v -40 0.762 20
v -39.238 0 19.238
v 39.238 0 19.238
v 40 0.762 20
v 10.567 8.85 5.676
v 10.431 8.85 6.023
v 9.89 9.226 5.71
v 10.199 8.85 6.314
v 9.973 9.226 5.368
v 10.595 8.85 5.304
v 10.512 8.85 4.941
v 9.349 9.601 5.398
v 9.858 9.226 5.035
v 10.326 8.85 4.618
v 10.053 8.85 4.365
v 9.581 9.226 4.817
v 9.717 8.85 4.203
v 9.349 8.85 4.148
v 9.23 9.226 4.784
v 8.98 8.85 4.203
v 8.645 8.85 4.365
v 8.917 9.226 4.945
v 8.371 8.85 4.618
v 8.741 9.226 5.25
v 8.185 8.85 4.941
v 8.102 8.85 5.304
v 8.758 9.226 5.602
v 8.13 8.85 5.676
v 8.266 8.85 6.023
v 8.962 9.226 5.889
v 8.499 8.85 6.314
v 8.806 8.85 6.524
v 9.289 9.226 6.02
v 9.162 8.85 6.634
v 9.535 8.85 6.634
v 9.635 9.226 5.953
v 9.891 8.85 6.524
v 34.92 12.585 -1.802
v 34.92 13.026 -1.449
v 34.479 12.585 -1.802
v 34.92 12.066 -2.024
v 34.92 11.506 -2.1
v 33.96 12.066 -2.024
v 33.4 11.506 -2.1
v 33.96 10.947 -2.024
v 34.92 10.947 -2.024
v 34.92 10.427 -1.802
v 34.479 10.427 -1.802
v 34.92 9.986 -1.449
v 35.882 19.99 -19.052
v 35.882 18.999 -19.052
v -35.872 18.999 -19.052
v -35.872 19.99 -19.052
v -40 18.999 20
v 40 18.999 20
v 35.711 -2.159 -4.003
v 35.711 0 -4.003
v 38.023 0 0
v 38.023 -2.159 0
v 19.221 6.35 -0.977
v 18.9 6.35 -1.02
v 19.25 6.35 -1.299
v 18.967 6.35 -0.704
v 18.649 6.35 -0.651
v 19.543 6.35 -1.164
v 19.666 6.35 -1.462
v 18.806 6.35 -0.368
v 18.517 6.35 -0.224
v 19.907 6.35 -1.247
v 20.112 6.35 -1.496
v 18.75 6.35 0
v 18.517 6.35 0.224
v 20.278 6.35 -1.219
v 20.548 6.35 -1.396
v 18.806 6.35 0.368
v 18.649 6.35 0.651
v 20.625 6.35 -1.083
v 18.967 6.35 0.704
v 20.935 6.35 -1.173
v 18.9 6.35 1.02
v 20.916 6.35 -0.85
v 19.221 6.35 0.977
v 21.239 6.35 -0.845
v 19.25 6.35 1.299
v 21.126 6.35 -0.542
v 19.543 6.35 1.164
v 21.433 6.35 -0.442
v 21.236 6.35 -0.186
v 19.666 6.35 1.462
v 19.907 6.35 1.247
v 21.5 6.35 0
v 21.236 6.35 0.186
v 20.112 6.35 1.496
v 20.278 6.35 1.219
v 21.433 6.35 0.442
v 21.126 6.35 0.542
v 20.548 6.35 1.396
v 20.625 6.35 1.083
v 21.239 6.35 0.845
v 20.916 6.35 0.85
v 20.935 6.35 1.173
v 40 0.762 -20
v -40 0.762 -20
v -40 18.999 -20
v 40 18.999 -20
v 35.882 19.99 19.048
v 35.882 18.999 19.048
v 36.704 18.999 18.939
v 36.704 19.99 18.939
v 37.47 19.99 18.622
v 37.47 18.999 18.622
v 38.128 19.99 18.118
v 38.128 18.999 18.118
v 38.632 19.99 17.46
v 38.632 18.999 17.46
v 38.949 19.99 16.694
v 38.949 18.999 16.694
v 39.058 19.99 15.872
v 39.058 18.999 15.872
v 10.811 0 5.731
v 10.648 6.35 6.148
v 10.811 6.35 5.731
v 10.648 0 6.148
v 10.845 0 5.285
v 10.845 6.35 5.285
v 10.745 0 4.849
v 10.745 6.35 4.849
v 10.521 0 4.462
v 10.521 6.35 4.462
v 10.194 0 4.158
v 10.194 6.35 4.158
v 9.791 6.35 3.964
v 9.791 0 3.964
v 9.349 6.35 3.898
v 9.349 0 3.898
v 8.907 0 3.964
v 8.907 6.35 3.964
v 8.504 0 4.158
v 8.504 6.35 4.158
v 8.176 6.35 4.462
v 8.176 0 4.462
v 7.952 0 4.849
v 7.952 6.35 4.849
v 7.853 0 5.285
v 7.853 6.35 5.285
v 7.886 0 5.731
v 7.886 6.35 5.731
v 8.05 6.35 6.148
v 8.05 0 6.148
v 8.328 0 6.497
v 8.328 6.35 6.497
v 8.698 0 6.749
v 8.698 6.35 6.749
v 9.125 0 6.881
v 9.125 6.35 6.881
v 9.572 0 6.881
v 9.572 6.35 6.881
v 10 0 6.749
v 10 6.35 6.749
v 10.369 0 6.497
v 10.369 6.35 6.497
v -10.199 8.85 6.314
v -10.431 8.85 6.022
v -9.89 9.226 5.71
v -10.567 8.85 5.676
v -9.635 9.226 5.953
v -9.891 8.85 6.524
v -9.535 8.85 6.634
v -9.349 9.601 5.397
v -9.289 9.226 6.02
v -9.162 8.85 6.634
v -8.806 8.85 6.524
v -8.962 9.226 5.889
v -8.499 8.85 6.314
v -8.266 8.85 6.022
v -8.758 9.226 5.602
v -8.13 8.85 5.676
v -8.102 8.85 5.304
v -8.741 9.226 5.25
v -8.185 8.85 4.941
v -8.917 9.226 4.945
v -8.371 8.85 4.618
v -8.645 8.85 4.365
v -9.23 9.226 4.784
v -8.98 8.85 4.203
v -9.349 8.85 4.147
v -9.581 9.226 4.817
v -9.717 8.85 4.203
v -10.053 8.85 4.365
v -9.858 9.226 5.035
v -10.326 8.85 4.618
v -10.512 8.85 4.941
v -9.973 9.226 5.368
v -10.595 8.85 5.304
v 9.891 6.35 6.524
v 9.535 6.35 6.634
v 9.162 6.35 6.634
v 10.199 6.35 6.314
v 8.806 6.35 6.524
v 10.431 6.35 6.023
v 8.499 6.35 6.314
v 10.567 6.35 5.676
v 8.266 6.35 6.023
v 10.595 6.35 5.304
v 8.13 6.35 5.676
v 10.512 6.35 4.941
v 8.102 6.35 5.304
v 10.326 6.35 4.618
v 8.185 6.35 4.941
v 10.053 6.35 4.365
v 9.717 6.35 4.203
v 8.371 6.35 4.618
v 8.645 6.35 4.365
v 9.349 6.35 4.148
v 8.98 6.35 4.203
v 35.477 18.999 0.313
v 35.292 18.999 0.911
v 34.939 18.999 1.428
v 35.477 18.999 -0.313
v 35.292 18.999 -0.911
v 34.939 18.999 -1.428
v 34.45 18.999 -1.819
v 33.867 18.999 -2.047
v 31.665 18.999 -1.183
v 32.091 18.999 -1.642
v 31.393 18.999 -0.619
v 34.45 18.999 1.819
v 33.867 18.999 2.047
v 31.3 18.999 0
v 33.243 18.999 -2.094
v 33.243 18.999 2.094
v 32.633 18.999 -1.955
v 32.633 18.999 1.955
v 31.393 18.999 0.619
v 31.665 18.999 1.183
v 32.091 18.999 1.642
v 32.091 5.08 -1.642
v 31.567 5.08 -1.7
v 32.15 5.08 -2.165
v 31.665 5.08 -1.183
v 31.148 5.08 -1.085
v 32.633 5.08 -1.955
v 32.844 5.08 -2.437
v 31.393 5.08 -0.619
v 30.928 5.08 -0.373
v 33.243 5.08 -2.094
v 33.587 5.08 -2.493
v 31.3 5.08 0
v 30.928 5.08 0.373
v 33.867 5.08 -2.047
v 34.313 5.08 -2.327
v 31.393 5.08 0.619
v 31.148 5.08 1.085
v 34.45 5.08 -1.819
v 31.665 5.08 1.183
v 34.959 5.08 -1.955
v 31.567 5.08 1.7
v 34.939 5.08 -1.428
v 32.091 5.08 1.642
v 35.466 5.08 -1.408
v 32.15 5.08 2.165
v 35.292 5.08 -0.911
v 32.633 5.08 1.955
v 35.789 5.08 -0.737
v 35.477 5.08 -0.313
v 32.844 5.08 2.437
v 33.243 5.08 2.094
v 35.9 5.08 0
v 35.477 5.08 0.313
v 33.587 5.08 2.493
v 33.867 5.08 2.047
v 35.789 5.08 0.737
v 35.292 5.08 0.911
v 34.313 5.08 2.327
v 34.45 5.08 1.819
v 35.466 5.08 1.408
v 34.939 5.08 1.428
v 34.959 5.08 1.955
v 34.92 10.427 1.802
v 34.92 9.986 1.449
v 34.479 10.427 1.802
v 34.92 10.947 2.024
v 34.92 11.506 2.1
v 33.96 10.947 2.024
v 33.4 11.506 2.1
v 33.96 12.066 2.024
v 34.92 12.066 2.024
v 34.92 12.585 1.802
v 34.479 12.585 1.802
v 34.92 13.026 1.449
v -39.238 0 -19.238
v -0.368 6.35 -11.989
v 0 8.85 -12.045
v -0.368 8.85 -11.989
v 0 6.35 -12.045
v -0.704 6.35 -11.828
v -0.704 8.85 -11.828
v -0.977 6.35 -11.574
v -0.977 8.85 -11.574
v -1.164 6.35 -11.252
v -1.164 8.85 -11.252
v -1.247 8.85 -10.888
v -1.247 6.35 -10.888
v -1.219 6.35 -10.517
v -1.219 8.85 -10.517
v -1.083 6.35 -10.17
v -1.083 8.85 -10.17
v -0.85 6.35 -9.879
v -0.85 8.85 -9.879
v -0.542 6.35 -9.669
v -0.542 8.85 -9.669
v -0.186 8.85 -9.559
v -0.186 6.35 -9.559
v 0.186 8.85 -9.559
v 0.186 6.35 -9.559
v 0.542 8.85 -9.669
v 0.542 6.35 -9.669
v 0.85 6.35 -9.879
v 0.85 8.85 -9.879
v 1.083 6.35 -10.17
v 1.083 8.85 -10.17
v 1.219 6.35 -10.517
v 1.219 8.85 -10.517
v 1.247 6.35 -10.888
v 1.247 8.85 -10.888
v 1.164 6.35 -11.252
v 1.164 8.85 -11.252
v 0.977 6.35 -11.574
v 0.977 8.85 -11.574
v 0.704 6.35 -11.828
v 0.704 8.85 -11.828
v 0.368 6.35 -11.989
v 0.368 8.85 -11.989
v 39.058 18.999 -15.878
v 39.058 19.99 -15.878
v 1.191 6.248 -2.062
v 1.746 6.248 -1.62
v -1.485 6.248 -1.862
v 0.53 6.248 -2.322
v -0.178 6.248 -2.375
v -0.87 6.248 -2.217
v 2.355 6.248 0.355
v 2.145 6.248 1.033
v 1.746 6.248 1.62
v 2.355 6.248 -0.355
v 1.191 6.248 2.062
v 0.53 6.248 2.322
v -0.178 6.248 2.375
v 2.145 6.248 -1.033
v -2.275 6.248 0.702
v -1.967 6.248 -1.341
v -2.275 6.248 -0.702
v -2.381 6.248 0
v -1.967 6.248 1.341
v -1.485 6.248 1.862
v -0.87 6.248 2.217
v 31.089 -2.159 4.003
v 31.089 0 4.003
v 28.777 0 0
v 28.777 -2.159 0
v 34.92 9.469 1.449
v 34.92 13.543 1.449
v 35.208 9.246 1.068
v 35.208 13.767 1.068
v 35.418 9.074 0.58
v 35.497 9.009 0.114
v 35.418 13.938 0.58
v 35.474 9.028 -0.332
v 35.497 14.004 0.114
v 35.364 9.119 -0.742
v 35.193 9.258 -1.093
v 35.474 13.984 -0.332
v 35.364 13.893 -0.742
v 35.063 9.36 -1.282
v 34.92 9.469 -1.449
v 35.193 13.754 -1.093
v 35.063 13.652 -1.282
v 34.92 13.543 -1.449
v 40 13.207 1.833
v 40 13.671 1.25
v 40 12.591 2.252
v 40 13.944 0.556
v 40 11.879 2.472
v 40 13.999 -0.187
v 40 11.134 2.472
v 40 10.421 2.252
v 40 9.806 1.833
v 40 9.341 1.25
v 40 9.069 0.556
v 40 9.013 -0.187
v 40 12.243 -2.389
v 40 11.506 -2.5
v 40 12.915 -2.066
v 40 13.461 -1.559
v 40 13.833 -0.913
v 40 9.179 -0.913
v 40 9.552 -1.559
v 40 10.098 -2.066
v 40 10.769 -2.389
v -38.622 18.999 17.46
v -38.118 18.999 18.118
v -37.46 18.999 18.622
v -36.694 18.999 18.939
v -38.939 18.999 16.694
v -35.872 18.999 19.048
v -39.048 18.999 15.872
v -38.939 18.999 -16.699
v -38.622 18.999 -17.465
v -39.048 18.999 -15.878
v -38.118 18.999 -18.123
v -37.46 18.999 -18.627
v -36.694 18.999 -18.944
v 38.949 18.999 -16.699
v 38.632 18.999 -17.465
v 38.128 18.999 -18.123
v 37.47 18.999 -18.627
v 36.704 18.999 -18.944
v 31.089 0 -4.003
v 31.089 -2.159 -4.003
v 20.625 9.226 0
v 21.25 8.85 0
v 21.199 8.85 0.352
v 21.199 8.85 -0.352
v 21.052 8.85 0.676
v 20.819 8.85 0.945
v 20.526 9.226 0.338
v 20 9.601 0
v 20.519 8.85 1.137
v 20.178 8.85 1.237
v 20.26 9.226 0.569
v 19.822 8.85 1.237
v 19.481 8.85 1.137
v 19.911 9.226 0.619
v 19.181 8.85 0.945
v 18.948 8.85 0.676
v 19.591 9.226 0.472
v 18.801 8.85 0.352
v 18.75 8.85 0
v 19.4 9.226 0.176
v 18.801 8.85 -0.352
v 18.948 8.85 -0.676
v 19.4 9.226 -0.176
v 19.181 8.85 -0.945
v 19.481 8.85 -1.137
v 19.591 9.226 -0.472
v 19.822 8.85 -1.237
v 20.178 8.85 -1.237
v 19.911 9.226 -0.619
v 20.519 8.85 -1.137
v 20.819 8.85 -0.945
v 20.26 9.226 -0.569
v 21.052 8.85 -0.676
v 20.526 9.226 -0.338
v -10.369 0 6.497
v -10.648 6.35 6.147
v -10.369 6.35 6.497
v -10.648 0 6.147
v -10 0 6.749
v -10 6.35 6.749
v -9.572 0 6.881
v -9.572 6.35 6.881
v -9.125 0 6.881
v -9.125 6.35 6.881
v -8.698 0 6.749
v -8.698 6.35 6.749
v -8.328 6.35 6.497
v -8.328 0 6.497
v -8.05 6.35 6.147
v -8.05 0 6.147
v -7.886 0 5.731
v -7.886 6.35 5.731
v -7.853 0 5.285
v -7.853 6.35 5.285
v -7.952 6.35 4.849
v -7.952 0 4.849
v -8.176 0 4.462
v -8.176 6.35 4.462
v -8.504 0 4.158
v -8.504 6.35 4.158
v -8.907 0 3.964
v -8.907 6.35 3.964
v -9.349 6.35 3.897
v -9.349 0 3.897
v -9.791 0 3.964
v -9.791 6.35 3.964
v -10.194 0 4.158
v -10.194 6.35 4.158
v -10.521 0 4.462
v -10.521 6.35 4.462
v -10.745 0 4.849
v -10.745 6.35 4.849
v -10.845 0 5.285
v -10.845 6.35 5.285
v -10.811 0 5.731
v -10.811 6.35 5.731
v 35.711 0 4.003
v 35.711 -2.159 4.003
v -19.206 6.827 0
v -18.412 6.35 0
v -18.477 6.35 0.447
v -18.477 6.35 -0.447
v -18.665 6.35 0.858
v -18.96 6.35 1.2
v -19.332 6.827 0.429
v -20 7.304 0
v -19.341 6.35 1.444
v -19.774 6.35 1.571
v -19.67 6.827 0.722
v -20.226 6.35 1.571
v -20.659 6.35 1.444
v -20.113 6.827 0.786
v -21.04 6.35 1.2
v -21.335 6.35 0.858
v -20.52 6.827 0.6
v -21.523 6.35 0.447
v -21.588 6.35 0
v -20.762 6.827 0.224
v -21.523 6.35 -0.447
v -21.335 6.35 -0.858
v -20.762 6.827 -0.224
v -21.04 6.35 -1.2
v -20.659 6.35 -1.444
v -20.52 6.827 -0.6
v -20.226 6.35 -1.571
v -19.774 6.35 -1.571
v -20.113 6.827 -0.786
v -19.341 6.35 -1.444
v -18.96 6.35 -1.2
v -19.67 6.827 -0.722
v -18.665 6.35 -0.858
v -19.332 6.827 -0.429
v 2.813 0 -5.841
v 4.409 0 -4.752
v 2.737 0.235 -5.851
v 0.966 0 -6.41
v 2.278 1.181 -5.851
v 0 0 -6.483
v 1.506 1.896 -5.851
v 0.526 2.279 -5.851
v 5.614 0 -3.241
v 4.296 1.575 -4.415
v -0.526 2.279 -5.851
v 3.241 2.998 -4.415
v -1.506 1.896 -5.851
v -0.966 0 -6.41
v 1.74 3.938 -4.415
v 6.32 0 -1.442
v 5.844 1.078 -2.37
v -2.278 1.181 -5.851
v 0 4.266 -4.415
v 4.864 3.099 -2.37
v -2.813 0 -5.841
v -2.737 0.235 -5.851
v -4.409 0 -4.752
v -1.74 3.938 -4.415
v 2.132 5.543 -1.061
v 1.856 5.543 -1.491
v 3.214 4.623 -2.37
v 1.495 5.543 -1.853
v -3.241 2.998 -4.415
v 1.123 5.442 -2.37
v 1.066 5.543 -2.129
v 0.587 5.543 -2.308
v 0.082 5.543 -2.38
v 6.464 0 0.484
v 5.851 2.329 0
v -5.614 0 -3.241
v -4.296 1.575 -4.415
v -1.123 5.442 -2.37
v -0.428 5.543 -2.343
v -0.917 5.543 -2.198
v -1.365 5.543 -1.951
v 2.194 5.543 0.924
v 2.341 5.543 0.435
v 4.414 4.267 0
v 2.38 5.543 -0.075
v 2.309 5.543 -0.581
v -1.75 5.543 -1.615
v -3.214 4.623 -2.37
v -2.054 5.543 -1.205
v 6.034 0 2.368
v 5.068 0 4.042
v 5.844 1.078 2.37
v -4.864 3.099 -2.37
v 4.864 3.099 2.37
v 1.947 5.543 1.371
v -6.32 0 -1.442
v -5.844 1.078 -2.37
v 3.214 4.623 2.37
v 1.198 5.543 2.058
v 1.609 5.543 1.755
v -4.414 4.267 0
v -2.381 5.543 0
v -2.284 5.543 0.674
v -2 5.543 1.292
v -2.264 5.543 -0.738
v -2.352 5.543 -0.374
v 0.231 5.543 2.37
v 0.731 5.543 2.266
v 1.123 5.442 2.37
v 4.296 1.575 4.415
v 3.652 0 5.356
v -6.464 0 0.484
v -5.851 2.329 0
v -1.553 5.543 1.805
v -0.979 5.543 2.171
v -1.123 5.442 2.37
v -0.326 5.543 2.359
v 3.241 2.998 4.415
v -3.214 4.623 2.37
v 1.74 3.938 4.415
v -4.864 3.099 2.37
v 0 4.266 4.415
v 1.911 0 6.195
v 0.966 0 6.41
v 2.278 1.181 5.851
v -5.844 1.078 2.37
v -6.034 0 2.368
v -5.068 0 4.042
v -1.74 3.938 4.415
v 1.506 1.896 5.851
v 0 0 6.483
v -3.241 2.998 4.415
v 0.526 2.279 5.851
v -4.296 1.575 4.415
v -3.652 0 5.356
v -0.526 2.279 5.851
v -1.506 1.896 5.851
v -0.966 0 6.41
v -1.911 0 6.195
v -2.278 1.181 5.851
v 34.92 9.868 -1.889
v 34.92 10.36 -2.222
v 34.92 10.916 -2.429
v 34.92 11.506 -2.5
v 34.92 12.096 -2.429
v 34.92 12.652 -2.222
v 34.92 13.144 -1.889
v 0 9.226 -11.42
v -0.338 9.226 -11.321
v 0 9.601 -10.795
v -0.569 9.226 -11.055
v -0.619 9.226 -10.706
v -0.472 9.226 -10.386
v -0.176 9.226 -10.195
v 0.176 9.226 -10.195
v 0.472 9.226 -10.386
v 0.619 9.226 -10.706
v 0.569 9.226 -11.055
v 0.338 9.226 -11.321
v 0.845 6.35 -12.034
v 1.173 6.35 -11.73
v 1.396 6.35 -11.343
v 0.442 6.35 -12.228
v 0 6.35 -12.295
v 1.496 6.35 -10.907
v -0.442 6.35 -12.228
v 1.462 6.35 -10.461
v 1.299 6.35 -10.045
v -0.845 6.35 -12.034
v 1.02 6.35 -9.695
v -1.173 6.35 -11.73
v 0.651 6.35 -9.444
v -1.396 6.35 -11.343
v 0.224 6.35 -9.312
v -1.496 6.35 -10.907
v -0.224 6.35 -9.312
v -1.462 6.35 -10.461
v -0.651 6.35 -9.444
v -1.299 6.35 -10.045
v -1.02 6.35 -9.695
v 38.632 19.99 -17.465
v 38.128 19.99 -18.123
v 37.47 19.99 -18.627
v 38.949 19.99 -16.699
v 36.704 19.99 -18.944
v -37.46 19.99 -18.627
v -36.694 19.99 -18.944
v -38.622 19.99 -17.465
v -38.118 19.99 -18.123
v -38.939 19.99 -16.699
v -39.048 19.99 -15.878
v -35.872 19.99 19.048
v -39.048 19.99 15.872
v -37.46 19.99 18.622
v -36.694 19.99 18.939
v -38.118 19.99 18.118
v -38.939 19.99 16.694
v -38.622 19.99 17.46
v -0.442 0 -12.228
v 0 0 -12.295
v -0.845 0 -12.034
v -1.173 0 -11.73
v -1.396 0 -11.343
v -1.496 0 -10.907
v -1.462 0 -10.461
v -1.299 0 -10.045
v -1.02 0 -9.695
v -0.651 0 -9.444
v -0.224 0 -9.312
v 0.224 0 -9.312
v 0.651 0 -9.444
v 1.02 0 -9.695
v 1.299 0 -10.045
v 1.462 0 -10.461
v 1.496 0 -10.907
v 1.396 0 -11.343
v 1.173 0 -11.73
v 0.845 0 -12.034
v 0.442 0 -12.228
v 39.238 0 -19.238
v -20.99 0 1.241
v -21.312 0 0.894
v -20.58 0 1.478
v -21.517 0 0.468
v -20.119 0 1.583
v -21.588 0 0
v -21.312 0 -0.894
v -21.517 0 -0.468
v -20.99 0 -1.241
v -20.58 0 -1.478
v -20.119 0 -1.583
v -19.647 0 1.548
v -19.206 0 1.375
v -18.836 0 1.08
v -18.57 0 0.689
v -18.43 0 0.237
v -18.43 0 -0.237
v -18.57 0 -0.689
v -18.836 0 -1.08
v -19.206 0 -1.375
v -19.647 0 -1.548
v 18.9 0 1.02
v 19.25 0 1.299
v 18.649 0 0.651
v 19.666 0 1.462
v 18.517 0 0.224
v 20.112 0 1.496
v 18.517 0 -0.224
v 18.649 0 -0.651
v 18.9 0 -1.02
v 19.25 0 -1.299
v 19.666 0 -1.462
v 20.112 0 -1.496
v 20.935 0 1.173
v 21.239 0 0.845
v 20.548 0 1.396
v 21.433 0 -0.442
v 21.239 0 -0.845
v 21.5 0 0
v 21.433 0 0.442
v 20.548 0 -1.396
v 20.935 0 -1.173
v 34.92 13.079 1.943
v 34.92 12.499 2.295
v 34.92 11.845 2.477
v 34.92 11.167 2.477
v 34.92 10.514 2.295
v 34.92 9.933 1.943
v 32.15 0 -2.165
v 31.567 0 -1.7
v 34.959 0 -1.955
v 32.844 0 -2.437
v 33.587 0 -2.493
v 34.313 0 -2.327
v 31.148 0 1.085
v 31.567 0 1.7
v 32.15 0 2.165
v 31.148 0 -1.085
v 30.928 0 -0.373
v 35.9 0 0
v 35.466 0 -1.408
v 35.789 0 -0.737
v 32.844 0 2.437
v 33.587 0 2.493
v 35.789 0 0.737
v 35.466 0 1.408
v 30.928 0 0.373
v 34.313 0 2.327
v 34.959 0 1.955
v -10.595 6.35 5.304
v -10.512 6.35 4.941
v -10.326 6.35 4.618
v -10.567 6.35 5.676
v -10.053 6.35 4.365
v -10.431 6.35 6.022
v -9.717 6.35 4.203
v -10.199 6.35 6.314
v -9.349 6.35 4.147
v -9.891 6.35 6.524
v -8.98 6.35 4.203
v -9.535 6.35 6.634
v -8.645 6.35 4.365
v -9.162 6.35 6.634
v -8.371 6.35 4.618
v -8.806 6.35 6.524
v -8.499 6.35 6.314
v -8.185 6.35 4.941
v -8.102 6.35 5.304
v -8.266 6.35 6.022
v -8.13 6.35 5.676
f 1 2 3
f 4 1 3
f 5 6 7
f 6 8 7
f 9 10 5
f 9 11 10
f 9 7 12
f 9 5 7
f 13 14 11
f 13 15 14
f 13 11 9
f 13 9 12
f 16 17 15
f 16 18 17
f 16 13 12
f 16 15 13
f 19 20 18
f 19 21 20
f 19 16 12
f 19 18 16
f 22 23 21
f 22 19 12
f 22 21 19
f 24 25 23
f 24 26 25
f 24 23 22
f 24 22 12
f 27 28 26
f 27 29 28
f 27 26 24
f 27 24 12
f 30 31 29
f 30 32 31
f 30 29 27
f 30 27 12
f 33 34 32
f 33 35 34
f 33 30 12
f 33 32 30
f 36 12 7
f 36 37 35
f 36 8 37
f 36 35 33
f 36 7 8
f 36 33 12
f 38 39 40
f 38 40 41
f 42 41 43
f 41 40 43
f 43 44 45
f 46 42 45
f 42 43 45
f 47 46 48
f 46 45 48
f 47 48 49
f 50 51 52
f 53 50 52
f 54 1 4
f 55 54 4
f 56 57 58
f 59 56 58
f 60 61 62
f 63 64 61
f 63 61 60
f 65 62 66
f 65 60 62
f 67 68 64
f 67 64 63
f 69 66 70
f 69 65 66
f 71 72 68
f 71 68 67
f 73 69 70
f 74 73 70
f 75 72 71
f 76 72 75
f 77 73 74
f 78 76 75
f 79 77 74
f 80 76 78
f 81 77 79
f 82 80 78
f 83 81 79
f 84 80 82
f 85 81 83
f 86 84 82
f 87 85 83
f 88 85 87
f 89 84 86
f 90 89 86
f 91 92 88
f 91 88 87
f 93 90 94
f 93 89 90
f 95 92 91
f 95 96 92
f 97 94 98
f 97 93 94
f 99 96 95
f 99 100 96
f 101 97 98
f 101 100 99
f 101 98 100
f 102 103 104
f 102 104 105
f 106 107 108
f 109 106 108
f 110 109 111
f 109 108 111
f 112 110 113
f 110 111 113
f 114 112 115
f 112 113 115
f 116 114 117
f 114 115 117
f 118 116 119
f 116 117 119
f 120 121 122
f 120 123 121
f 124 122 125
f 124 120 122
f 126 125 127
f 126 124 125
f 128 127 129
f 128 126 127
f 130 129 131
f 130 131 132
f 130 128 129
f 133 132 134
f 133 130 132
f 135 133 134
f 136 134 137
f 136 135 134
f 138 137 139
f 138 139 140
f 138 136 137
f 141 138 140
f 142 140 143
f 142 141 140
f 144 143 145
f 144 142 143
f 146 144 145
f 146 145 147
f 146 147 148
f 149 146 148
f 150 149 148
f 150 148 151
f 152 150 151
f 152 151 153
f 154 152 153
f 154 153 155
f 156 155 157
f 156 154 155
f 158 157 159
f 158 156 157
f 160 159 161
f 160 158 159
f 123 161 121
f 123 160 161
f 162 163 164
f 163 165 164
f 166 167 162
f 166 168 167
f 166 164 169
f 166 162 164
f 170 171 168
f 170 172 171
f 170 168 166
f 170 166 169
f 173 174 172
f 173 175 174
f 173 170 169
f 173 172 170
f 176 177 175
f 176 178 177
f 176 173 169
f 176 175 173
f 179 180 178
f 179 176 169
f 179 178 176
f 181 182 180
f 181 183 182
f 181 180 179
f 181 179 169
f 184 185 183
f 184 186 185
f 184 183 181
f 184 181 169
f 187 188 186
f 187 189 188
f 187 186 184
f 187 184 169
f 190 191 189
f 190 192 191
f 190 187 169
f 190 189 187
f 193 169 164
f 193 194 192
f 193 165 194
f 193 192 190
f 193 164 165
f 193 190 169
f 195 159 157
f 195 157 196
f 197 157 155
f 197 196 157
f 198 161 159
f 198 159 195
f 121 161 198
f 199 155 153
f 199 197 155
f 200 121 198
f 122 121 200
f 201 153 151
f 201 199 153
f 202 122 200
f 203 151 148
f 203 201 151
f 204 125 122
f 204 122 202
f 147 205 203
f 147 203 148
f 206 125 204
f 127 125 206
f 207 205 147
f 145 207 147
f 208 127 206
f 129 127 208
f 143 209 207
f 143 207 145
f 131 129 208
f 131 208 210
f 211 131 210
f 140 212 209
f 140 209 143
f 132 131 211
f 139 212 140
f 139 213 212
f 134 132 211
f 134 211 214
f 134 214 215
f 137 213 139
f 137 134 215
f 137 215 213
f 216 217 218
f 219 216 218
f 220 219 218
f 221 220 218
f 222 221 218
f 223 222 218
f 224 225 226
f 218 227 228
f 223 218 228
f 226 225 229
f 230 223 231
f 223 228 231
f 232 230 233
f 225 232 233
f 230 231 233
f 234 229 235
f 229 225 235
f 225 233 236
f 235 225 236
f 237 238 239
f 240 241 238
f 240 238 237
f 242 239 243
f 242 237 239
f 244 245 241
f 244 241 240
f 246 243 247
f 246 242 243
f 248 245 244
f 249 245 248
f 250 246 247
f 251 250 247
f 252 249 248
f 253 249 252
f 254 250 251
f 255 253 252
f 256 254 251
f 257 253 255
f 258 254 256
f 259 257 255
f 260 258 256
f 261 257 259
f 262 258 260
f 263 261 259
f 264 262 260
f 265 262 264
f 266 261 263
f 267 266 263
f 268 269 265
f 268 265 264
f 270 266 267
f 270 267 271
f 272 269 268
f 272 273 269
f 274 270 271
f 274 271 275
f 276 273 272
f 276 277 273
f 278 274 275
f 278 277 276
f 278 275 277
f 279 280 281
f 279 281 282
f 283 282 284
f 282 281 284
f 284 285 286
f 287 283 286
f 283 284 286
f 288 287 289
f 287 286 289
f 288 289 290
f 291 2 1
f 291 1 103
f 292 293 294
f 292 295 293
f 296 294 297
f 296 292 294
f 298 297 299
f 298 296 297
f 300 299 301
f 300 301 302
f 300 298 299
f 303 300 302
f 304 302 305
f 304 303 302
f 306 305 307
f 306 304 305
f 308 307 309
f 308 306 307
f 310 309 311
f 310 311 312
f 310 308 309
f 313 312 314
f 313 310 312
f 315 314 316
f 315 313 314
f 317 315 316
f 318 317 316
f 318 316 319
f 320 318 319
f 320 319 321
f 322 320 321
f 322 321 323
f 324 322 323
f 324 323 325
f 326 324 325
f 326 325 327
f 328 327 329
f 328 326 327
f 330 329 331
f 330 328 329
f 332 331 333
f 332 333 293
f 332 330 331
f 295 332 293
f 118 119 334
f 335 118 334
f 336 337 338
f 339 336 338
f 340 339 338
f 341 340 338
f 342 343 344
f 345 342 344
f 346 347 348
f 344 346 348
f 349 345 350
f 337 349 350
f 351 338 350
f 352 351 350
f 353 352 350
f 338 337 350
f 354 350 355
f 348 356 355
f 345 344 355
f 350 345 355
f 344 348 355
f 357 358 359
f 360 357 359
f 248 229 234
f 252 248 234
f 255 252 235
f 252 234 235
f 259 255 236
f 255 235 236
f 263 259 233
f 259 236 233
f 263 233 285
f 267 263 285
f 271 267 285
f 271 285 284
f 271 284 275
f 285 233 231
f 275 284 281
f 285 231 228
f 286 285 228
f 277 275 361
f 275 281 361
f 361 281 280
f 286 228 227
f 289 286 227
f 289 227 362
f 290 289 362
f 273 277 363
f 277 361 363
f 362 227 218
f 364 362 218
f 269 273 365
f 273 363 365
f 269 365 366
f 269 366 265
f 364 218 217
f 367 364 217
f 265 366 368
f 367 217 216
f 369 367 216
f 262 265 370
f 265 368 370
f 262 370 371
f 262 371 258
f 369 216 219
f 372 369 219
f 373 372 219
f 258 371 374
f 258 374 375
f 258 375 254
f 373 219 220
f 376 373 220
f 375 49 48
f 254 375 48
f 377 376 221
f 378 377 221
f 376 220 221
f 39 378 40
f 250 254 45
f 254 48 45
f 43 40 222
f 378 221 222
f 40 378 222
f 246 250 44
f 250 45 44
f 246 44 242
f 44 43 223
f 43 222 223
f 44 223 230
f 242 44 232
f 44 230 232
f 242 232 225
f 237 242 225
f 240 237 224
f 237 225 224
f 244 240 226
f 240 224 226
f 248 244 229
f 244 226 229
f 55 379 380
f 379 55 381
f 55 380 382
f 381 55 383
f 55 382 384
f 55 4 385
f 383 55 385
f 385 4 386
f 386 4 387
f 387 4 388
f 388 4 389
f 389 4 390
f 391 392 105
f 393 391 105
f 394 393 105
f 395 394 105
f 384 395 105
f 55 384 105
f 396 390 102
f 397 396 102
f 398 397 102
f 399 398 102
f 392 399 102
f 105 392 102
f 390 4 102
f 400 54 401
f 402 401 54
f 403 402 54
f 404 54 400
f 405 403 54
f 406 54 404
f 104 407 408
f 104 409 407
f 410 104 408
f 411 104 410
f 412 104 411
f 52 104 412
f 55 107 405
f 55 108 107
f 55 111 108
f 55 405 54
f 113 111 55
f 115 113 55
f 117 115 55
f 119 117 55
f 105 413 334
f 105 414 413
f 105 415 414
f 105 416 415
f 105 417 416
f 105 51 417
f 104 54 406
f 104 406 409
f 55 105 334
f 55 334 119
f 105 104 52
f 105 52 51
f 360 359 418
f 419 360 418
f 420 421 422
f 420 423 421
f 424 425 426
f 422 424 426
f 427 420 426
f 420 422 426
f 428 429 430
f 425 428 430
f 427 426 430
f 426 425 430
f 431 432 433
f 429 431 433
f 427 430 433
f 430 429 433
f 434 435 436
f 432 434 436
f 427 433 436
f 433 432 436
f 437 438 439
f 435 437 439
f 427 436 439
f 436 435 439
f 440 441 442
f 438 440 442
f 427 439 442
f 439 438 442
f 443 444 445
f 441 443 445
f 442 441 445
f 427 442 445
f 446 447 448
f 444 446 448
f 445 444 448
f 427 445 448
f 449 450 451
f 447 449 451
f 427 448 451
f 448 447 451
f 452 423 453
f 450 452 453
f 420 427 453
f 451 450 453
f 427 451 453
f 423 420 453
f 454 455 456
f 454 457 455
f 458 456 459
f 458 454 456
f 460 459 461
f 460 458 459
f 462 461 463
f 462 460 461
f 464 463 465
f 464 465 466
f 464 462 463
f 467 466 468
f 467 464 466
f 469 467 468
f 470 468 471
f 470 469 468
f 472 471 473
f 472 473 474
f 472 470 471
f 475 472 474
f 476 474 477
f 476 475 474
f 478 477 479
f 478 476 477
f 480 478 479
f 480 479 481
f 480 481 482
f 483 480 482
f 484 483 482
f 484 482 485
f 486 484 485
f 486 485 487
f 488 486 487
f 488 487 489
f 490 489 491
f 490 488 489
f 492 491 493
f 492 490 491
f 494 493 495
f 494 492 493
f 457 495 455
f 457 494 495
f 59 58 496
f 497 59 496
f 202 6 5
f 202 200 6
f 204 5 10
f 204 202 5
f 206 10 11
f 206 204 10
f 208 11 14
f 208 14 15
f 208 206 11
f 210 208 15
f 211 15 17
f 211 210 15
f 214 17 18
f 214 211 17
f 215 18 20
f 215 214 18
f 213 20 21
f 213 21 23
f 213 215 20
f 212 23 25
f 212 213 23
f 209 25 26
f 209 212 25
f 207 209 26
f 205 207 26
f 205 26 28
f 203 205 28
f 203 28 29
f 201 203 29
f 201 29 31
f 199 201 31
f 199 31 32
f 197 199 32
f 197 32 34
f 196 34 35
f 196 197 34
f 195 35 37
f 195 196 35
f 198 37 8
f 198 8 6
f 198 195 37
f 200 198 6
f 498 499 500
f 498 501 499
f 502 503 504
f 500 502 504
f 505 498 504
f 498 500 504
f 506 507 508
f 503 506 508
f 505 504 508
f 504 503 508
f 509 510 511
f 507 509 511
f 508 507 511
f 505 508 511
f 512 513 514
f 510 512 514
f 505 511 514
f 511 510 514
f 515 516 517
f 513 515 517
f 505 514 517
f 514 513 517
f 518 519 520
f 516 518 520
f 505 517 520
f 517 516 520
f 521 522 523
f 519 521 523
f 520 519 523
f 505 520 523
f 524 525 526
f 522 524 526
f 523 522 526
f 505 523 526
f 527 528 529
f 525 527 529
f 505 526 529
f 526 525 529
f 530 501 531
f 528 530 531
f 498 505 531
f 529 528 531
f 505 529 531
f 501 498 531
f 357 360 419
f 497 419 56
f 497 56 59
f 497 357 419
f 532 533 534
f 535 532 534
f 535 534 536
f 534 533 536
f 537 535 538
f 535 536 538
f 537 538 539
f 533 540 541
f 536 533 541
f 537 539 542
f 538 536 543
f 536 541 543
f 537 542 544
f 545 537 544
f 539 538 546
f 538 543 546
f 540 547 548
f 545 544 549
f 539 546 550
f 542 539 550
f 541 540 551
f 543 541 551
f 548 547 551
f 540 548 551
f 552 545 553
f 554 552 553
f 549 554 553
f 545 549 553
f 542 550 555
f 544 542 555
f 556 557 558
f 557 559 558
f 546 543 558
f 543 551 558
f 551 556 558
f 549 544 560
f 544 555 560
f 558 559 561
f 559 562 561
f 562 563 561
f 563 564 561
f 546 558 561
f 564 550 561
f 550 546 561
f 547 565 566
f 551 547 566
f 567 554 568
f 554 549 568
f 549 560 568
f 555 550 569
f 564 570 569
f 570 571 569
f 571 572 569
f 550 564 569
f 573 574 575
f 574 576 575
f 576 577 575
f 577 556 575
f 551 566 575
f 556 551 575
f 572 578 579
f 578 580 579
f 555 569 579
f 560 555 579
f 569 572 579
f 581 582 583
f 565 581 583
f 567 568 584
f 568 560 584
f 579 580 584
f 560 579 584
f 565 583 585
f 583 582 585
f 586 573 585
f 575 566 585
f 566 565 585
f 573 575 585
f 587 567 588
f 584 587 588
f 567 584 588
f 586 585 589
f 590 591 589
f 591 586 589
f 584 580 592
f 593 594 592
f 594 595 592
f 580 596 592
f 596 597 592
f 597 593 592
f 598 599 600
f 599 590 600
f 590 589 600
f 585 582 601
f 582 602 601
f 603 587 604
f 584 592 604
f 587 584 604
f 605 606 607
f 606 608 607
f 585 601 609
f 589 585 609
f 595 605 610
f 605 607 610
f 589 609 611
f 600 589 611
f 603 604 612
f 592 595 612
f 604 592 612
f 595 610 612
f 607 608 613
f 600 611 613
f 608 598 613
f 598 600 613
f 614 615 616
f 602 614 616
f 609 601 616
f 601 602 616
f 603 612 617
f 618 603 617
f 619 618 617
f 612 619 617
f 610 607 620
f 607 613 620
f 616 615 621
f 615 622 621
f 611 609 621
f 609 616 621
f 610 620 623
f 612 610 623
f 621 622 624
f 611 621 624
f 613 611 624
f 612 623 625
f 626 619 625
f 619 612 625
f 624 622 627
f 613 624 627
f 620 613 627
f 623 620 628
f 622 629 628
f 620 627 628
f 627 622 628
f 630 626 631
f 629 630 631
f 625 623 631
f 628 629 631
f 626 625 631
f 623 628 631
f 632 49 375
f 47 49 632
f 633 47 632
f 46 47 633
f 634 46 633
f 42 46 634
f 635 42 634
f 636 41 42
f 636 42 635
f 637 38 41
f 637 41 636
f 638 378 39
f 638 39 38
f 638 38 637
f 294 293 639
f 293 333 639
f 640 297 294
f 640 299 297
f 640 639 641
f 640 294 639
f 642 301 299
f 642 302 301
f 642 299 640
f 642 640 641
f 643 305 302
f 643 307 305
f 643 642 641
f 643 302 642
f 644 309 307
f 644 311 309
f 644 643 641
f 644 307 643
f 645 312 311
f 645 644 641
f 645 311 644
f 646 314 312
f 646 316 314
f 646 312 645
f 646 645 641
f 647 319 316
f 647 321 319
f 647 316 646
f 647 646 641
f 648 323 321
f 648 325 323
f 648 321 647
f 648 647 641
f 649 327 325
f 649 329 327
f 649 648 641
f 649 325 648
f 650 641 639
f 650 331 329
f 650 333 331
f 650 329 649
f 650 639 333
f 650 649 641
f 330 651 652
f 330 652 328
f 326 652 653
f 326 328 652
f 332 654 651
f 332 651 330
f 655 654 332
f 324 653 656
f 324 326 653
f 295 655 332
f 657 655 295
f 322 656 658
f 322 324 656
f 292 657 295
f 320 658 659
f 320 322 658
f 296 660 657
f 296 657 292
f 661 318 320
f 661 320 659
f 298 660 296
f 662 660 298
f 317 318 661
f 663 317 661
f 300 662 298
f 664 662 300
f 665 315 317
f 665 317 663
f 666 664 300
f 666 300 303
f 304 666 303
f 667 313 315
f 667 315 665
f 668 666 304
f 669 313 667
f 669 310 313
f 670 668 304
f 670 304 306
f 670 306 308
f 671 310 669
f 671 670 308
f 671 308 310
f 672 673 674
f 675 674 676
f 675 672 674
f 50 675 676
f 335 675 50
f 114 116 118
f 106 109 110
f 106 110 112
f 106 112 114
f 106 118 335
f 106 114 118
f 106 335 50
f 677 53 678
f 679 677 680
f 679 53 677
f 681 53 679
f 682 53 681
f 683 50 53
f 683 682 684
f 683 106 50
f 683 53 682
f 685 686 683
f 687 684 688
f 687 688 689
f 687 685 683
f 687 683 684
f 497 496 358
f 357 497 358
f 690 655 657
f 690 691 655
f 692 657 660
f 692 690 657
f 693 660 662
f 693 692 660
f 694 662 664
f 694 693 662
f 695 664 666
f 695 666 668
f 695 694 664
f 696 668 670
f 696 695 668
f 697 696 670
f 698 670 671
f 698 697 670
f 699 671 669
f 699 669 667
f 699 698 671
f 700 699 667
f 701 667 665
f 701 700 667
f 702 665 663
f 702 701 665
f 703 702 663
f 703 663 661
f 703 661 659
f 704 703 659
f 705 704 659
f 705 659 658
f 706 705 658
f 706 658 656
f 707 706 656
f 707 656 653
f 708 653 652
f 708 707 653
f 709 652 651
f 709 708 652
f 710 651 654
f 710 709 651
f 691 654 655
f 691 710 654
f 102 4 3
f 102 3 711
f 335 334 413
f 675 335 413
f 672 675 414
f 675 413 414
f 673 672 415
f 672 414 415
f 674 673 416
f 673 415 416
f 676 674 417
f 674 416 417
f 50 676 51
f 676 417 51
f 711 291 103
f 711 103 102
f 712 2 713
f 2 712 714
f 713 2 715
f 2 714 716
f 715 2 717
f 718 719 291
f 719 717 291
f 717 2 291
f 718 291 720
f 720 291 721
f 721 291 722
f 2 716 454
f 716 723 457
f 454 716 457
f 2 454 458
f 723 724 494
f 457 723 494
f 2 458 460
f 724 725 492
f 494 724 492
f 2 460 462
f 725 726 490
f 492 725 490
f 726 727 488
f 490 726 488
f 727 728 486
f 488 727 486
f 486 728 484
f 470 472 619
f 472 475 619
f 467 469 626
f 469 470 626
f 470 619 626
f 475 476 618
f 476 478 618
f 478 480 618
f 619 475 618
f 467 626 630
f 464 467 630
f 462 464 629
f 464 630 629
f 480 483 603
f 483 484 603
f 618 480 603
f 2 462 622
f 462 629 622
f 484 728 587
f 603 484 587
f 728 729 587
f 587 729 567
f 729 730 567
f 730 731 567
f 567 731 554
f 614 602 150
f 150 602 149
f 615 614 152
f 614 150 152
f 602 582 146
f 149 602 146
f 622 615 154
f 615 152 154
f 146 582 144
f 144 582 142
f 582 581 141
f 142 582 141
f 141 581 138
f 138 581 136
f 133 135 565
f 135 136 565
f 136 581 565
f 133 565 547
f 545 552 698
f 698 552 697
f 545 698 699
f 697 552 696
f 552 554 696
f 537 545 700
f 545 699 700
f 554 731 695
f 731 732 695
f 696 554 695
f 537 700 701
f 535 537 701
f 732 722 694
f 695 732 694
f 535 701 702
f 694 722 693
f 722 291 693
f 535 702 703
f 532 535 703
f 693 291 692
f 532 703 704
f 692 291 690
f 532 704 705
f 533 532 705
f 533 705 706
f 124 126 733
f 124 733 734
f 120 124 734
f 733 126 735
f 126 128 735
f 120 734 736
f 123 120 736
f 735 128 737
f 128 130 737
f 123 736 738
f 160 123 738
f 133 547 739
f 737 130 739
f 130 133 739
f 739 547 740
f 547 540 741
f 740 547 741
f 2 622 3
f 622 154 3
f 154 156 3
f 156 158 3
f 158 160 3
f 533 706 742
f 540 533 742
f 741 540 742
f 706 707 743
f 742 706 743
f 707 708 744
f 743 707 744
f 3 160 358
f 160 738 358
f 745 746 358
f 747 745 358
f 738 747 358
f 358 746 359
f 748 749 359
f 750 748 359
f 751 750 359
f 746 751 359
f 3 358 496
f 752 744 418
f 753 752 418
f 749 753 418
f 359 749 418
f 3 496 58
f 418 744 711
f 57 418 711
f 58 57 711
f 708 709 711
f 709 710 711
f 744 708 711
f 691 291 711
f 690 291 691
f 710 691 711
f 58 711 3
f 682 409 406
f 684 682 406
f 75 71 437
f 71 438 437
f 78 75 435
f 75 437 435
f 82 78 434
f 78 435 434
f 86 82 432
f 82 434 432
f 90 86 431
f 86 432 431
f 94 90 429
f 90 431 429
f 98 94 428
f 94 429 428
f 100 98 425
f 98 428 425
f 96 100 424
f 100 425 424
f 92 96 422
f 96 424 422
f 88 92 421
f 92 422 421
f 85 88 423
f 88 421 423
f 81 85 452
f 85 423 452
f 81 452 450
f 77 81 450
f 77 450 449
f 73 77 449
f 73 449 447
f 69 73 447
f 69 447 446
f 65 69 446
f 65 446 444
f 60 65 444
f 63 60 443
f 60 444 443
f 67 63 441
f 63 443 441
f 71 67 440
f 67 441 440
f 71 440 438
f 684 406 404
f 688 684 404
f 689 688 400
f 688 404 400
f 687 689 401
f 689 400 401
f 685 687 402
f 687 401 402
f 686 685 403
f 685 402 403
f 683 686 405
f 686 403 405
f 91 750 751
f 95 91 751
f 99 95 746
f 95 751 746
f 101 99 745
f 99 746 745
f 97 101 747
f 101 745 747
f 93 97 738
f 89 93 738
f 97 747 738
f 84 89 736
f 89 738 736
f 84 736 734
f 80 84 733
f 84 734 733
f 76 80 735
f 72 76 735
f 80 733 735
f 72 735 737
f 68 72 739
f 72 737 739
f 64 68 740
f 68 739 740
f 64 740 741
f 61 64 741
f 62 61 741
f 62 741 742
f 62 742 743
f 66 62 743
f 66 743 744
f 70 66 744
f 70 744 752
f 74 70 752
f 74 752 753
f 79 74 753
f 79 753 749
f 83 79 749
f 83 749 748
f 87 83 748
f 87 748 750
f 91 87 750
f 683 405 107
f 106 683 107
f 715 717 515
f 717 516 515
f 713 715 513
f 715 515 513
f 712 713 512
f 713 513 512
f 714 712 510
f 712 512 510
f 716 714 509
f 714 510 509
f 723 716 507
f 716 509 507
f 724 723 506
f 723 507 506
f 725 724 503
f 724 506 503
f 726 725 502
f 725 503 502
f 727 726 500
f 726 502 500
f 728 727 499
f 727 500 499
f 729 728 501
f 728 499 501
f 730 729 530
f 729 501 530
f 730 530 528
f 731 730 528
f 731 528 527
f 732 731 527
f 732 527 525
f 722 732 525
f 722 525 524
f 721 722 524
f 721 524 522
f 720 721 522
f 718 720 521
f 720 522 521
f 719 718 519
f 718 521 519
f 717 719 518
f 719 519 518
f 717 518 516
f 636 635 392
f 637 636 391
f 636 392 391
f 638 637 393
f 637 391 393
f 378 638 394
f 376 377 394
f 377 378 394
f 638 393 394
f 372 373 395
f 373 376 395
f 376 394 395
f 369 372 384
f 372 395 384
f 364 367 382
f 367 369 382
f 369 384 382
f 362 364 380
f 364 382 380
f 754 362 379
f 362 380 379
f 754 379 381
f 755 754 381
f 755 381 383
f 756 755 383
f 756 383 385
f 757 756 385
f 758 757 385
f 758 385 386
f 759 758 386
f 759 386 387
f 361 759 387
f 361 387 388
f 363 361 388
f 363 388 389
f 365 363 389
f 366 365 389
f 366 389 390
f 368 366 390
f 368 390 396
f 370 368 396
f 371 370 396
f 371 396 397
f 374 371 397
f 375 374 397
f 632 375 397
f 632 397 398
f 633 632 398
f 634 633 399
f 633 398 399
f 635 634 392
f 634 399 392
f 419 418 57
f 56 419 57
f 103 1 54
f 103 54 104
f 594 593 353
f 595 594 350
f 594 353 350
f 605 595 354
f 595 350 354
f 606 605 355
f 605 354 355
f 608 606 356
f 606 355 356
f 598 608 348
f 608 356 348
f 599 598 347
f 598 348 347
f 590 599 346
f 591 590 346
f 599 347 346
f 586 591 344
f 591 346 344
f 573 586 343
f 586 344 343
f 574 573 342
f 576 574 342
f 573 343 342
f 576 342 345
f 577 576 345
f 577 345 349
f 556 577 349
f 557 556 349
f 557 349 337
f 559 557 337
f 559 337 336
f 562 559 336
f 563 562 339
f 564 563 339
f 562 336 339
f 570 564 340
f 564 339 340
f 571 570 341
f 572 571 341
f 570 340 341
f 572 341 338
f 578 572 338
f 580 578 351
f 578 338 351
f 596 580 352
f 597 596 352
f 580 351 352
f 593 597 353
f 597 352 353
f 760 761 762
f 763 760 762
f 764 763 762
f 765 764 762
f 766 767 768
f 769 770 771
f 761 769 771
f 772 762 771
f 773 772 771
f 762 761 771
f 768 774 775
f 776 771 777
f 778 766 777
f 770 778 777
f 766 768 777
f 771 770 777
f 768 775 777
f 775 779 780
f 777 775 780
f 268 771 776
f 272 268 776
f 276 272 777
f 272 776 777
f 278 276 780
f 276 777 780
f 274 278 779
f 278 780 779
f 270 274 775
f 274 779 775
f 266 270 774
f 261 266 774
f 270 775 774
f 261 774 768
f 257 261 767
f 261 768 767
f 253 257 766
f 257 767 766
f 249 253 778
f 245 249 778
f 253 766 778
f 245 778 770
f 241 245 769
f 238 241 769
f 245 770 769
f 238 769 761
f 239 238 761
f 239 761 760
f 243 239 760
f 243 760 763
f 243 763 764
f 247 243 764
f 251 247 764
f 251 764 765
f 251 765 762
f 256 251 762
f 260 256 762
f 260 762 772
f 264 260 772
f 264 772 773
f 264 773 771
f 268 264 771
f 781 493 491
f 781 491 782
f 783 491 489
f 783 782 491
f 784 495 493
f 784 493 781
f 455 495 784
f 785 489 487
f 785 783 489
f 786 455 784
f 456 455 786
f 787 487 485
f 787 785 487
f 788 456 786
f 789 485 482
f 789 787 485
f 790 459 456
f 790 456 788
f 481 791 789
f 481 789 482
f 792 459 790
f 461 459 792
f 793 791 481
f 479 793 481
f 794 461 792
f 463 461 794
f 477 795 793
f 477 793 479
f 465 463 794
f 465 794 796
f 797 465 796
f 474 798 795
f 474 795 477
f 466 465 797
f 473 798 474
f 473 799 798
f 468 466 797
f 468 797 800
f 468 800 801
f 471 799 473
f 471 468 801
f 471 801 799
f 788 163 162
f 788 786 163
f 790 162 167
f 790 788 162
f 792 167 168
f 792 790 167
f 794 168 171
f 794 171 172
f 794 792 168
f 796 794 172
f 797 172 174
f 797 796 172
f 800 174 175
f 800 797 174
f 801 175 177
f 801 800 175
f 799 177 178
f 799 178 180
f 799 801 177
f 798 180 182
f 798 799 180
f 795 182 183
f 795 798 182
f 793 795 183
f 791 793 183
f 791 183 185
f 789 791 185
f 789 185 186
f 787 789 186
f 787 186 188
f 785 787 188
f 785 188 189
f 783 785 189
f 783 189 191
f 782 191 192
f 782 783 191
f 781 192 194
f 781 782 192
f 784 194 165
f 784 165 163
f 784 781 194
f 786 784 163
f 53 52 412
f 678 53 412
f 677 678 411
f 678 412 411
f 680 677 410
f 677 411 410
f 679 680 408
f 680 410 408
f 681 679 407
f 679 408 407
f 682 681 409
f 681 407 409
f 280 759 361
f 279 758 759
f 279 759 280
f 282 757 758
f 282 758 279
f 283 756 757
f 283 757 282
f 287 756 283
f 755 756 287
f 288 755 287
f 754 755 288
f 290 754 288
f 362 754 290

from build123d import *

# Parameters (mm, degrees)
SKETCH1_W                          = 80
SKETCH1_H                          = 40
EXTRUDE1_DEPTH                     = 18.9992
F_1_8_0_125_DIAMETER_HOLE1_D       = 3.175
F_1_8_0_125_DIAMETER_HOLE1_DEPTH   = 6.35
F_1_8_0_125_DIAMETER_HOLE1_TIP     = 0.953866233
M3X0_5_TAPPED_HOLE1_D              = 2.5
M3X0_5_TAPPED_HOLE1_DEPTH          = 8.849995
M3X0_5_TAPPED_HOLE1_CBORE_D        = 3
M3X0_5_TAPPED_HOLE1_CBORE_DEPTH    = 6.35
M3X0_5_TAPPED_HOLE1_TIP            = 0.751075774
M5X0_8_TAPPED_HOLE1_D              = 4.2
M5X0_8_TAPPED_HOLE1_CBORE_D        = 5
M5X0_8_TAPPED_HOLE1_CBORE_DEPTH    = 5.08
F_3_16_0_1875_DIAMETER_HOLE1_D     = 4.7625
F_3_16_0_1875_DIAMETER_HOLE1_DEPTH = 6.2484
CUT_REVOLVE1_ANGLE                 = 180
M5X0_8_TAPPED_HOLE2_D              = 4.2
M5X0_8_TAPPED_HOLE2_DEPTH          = 6.6
M5X0_8_TAPPED_HOLE2_CBORE_D        = 5
M5X0_8_TAPPED_HOLE2_CBORE_DEPTH    = 5.08
CIRPATTERN1_COUNT                  = 3
CHAMFER1_SIZE                      = 0.762
EXTRUDE2_DEPTH                     = 0.9906
EXTRUDE3_DEPTH                     = 2.159


with BuildPart() as part:
    # Sketch1 → Extrude1 (new body)
    with BuildSketch(Plane(origin=(0, 0, 0), x_dir=(1, 0, 0), z_dir=(0, 1, 0))):
        Rectangle(SKETCH1_W, SKETCH1_H)
    extrude(amount=EXTRUDE1_DEPTH)

    # 1_8 _0.125_ Diameter Hole1
    with Locations(Plane.XZ):
        with Locations((-20, 0)):
            Hole(F_1_8_0_125_DIAMETER_HOLE1_D / 2, depth=F_1_8_0_125_DIAMETER_HOLE1_DEPTH)
            with Locations((0, 0, -(F_1_8_0_125_DIAMETER_HOLE1_DEPTH + F_1_8_0_125_DIAMETER_HOLE1_TIP / 2))):  # 118° drill point
                Cone(0, F_1_8_0_125_DIAMETER_HOLE1_D / 2, F_1_8_0_125_DIAMETER_HOLE1_TIP, mode=Mode.SUBTRACT)

    # M3x0.5 Tapped Hole1
    with Locations(Plane.XZ):
        with Locations((20, 0)):
            CounterBoreHole(M3X0_5_TAPPED_HOLE1_D / 2, M3X0_5_TAPPED_HOLE1_CBORE_D / 2, M3X0_5_TAPPED_HOLE1_CBORE_DEPTH, depth=M3X0_5_TAPPED_HOLE1_DEPTH)
            with Locations((0, 0, -(M3X0_5_TAPPED_HOLE1_DEPTH + M3X0_5_TAPPED_HOLE1_TIP / 2))):  # 118° drill point
                Cone(0, M3X0_5_TAPPED_HOLE1_D / 2, M3X0_5_TAPPED_HOLE1_TIP, mode=Mode.SUBTRACT)

    # M5x0.8 Tapped Hole1 (through all)
    with Locations(Plane.XZ):
        with Locations((33.4, 0)):
            CounterBoreHole(M5X0_8_TAPPED_HOLE1_D / 2, M5X0_8_TAPPED_HOLE1_CBORE_D / 2, M5X0_8_TAPPED_HOLE1_CBORE_DEPTH)

    # 3_16 _0.1875_ Diameter Hole1
    with Locations(Plane.XZ):
        with Locations((0, 0)):
            Hole(F_3_16_0_1875_DIAMETER_HOLE1_D / 2, depth=F_3_16_0_1875_DIAMETER_HOLE1_DEPTH)

    # Sketch12 → Cut-Revolve1 (revolve, cut)
    with BuildSketch(Plane.XZ.offset(0.508)):
        with BuildLine():
            Line((0, 6.5024), (0, -6.5024))
            ThreePointArc((0, -6.5024), (6.5024, 0), (0, 6.5024))
        make_face()
    revolve(axis=Axis((0, -0.508, 6.5024), (0, 0, 1)), revolution_arc=CUT_REVOLVE1_ANGLE, mode=Mode.SUBTRACT)

    # M5x0.8 Tapped Hole2
    with Locations(Plane(origin=(40, 0, 0), x_dir=(0, 0, -1), z_dir=(1, 0, 0))):
        with Locations((0, 11.5062)):
            CounterBoreHole(M5X0_8_TAPPED_HOLE2_D / 2, M5X0_8_TAPPED_HOLE2_CBORE_D / 2, M5X0_8_TAPPED_HOLE2_CBORE_DEPTH, depth=M5X0_8_TAPPED_HOLE2_DEPTH)

    # Sketch15 → M3x0.5 Tapped Hole2 (revolve, cut)
    with BuildSketch(Plane(origin=(0, 0, -10.795), x_dir=(0, 0, -1), z_dir=(1, 0, 0))):
        Polygon((0, 0), (0, 9.601070774), (1.25, 8.849995), (1.25, 6.35), (1.5, 6.35), (1.5, 0), align=None)
    m3x0_5_tapped_hole2 = revolve(axis=Axis((0, -6.35, -10.795), (0, 1, 0)), mode=Mode.SUBTRACT)

    # CirPattern1: M3x0.5 Tapped Hole2 ×3 about axis
    cirpattern1_axis = Axis((0, 0, 0), (0, 1, 0))
    for i in range(1, CIRPATTERN1_COUNT):
        add(m3x0_5_tapped_hole2.rotate(cirpattern1_axis, i * 360 / CIRPATTERN1_COUNT), mode=Mode.SUBTRACT)

    # Chamfer1
    chamfer1_edges = [part.edges().sort_by_distance(p)[0] for p in [
        (0, 0, -20),
        (40, 0, 0),
        (0, 0, 20),
        (-40, 0, 0),
    ]]
    chamfer(chamfer1_edges, length=CHAMFER1_SIZE)

    # Sketch2 → Extrude2 (add)
    with BuildSketch(Plane(origin=(0, 18.9992, 0), x_dir=(-1, 0, 0), z_dir=(0, 1, 0))):
        with BuildLine():
            Line((35.8725, 19.0475), (-35.8825, 19.0475))
            ThreePointArc((-35.8825, 19.0475), (-38.12756403, 18.11756403), (-39.0575, 15.8725))
            Line((-39.0575, 15.8725), (-39.0575, -15.8775))
            ThreePointArc((-39.0575, -15.8775), (-38.12756403, -18.12256403), (-35.8825, -19.0525))
            Line((-35.8825, -19.0525), (35.8725, -19.0525))
            ThreePointArc((35.8725, -19.0525), (38.11756403, -18.12256403), (39.0475, -15.8775))
            Line((39.0475, -15.8775), (39.0475, 15.8725))
            ThreePointArc((39.0475, 15.8725), (38.11756403, 18.11756403), (35.8725, 19.0475))
        make_face()
    extrude(amount=EXTRUDE2_DEPTH)

    # Sketch17 → Extrude3 (add)
    with BuildSketch(Plane.XZ):
        Polygon((31.0886, -4.003386697), (35.7114, -4.003386697), (38.022930833, 0), (35.7114, 4.003386697), (31.0886, 4.003386697), (28.777069167, 0), align=None)
    extrude(amount=EXTRUDE3_DEPTH)


solid = part.part
